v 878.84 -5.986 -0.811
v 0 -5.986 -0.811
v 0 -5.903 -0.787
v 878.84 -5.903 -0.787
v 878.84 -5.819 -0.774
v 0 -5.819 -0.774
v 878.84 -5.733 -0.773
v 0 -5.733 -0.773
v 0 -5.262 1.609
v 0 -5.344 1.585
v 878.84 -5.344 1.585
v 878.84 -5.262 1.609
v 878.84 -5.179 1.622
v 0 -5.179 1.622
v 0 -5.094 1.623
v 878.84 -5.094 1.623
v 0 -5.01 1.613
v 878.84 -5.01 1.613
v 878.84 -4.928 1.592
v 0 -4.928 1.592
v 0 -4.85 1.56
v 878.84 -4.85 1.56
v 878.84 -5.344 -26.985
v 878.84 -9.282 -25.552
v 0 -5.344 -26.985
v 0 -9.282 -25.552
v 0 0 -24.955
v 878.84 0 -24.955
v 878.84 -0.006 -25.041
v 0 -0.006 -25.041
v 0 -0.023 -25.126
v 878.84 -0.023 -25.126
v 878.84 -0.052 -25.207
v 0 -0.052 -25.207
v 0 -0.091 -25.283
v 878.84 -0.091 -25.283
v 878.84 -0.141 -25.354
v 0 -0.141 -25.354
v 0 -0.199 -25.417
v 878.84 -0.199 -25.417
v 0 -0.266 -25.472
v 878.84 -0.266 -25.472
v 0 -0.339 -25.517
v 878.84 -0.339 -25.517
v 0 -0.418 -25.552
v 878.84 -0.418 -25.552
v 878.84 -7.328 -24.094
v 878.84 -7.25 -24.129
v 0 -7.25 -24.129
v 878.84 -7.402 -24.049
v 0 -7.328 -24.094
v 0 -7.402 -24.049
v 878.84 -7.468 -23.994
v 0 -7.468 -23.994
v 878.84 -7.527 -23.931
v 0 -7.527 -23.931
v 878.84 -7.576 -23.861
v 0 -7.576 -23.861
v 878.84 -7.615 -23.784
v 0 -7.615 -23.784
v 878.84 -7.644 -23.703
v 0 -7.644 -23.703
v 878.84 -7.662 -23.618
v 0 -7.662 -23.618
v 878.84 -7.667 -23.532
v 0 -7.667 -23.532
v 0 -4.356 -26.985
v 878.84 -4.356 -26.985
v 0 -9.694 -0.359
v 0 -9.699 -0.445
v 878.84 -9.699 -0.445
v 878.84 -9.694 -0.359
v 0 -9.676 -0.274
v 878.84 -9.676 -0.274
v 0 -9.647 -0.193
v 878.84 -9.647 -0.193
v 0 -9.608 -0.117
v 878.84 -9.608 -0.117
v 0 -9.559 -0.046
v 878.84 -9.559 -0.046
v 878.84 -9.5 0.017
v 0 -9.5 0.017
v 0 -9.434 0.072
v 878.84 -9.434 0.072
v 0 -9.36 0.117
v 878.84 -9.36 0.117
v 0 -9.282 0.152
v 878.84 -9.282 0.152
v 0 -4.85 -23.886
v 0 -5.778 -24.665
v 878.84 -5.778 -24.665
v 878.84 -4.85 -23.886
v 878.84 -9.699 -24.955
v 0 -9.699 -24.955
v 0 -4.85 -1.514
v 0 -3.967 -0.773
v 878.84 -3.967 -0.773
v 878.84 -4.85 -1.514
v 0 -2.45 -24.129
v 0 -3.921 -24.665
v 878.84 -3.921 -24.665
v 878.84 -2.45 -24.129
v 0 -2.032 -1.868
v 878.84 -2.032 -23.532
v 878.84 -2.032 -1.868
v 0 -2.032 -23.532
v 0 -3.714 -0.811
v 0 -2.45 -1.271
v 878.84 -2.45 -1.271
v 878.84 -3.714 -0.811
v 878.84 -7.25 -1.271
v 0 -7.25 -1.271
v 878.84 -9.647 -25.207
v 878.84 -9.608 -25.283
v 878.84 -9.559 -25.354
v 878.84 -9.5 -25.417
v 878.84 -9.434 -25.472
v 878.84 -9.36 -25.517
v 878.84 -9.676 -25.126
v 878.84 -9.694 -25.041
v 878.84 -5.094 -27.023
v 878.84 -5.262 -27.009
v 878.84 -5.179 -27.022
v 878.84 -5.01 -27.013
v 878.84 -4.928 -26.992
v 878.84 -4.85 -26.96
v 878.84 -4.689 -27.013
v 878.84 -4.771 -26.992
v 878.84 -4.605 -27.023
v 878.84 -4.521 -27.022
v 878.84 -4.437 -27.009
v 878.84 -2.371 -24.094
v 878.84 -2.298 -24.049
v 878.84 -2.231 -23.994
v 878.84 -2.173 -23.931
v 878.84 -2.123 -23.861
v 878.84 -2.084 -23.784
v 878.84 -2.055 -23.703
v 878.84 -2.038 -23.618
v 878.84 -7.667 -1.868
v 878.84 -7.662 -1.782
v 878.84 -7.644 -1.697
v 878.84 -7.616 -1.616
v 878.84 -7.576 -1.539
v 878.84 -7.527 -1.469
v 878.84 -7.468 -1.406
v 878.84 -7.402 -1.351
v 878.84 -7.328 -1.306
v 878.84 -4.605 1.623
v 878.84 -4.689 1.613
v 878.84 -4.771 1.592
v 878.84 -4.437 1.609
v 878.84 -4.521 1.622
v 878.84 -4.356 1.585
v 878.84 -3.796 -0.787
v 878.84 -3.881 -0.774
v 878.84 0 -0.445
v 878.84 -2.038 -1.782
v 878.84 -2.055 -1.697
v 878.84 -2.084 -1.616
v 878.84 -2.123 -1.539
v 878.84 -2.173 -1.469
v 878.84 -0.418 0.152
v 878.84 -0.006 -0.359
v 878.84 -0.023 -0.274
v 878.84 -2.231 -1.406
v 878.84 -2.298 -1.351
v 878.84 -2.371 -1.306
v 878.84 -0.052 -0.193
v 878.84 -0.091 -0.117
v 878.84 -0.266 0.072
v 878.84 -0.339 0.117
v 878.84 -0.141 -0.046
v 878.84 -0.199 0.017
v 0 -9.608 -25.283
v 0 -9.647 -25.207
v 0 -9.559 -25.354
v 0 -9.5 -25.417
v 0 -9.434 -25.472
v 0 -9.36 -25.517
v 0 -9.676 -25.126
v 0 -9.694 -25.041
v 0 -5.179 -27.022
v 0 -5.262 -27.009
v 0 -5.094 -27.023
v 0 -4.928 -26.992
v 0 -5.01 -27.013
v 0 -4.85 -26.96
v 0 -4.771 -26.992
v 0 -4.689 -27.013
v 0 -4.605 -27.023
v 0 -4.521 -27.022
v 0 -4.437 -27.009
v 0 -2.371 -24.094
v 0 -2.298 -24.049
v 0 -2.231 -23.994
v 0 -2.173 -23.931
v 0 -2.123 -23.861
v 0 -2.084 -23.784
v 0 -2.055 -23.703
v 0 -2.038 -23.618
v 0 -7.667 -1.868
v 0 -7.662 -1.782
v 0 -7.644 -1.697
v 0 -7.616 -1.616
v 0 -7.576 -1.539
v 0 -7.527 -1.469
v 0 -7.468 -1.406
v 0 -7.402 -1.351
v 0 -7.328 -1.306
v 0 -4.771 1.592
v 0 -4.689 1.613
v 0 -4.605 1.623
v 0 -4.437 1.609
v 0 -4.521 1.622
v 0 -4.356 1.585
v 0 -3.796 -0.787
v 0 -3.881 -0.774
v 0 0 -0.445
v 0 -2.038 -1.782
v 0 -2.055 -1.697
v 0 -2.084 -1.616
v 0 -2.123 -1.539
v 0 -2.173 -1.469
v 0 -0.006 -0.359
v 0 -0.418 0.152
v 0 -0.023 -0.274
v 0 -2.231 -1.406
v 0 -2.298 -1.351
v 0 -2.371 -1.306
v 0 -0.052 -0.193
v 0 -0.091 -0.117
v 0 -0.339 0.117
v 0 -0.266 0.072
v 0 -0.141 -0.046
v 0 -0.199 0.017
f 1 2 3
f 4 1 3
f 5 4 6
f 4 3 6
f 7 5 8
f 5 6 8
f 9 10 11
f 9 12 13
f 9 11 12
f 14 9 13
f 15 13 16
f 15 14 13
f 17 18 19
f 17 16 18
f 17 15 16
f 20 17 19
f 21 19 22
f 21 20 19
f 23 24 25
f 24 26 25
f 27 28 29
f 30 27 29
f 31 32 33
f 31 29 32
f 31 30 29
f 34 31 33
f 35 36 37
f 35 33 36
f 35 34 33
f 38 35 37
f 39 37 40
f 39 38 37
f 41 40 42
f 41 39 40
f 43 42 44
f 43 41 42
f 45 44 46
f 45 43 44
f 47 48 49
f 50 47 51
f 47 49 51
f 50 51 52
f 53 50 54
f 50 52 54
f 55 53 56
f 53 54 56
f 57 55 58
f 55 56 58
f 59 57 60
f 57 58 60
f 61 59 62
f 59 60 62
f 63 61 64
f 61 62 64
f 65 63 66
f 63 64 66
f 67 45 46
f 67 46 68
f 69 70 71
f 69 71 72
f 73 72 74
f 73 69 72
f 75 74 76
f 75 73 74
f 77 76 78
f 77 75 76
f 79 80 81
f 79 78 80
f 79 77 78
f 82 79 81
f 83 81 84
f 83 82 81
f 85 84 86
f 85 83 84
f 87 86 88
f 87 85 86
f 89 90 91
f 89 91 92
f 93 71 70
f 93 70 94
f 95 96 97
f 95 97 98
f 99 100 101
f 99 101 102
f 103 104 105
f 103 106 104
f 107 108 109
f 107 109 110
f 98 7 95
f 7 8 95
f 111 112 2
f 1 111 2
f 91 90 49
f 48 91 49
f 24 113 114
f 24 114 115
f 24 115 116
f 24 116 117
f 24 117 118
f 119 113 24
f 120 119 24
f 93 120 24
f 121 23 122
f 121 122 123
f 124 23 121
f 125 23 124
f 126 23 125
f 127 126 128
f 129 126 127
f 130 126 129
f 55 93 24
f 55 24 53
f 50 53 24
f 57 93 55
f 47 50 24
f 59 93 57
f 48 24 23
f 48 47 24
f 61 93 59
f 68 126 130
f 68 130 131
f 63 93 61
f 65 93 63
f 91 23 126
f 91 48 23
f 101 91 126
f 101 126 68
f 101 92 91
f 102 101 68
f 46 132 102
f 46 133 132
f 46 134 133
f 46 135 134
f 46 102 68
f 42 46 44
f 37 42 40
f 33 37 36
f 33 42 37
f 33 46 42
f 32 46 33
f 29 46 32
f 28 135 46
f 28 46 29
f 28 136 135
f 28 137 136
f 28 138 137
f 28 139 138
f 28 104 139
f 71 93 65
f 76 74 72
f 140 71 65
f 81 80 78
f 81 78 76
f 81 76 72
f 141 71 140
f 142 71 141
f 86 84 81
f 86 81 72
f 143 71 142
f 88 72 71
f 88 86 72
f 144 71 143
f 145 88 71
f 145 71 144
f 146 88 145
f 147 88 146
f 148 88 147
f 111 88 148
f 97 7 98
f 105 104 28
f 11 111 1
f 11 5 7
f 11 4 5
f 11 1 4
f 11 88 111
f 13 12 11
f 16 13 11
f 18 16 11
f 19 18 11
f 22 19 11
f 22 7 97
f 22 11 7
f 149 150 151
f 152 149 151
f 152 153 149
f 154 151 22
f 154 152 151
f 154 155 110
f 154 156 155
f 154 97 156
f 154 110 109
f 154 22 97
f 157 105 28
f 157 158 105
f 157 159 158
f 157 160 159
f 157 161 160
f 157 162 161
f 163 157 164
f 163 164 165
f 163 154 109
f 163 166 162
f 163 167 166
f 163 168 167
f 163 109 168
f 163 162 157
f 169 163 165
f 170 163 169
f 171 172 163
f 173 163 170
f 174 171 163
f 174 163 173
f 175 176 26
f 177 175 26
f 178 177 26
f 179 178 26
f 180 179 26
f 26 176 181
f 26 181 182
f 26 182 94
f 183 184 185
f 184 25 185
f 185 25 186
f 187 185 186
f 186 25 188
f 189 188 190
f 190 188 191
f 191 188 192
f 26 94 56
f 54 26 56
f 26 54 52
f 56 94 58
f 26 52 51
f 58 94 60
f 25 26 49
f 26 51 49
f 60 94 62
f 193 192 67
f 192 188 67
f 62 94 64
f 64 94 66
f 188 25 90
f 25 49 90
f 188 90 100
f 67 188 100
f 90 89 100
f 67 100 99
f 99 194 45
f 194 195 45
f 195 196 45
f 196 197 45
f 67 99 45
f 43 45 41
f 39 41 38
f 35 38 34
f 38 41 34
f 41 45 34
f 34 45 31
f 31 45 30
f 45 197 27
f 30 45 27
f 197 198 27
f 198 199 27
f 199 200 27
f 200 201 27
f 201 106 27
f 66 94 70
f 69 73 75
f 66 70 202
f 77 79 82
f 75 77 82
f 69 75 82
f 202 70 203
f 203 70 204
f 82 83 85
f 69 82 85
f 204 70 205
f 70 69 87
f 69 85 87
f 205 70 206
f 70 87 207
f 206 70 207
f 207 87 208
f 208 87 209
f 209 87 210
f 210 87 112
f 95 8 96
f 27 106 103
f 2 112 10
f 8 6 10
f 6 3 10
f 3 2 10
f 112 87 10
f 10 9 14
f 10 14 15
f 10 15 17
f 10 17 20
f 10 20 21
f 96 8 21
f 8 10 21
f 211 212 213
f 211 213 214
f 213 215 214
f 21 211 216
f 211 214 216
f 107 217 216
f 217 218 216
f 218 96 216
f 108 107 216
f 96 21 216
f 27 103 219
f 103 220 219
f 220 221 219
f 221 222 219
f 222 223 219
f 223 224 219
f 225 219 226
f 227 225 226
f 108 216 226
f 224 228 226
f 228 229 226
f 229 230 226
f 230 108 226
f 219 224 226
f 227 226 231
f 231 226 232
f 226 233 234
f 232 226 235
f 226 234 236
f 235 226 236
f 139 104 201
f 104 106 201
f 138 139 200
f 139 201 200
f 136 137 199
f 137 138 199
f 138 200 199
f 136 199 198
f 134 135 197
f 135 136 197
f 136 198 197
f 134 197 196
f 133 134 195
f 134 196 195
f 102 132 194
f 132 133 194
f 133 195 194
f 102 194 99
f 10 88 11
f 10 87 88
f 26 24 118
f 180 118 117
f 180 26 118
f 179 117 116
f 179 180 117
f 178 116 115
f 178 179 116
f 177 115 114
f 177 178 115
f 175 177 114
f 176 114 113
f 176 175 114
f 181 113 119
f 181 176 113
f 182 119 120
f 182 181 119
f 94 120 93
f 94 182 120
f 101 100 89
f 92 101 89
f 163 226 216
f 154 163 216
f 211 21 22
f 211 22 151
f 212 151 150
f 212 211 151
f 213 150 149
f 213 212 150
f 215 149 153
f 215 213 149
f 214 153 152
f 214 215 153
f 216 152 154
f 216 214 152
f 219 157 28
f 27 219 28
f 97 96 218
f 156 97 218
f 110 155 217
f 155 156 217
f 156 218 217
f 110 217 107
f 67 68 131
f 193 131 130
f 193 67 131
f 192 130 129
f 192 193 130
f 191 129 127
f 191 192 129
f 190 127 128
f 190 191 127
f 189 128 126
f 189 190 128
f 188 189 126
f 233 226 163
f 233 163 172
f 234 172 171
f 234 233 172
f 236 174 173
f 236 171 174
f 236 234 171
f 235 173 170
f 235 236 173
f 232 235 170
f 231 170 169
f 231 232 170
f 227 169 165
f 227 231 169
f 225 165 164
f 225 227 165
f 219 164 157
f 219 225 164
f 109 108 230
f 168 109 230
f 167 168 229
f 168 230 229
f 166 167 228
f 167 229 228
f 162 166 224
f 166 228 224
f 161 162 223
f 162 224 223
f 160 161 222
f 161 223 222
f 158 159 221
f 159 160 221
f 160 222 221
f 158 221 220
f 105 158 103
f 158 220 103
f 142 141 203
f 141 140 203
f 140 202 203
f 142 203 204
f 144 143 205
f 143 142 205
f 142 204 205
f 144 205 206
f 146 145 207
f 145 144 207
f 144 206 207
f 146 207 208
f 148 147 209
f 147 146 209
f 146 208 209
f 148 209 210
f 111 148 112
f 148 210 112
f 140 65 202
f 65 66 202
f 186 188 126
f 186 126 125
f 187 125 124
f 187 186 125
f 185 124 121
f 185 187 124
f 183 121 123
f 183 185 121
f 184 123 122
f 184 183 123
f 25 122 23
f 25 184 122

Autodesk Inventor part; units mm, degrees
ref_plane "YZ Plane" through (0, 0, 0) normal (1, 0, 0) x (0, 1, 0)
ref_plane "XZ Plane" through (0, 0, 0) normal (0, 1, 0) x (-1, 0, 0)
ref_plane "XY Plane" through (0, 0, 0) normal (0, 0, 1) x (1, 0, 0)
sketch "Sketch1" plane through (0, 0, 0) normal (1, 0, 0) x (0, 1, 0)
  line L0 (0, -0.4446) -> (0, -24.9554)
  line L1 (-0.4178, -25.5521) -> (-4.3558, -26.9854)
  line L2 (-0.4178, 0.1521) -> (-4.3558, 1.5854)
  line L3 (-5.0594, 1.3969) -> (-6.4063, -0.2083)
  line L4 (-4.8497, -23.8856) -> (-4.8389, -24.1212)
  line L5 (-3.9874, -24.6889) -> (-2.4498, -24.1293)
  line L6 (-2.032, -23.5325) -> (-2.032, -1.8675)
  line L7 (-2.4498, -1.2707) -> (-3.7138, -0.8107)
  line L8 (-4.4174, -0.9992) -> (-4.8497, -1.5144)
  line L9 (-6.4063, -0.2083) -> (-4.8497, -1.5144)
  arc A0 (0, -0.4446) -> (-0.4178, 0.1521) centre (-0.635, -0.4446) ccw
  arc A1 (-2.032, -1.8675) -> (-2.4498, -1.2707) centre (-2.667, -1.8675) ccw
  arc A2 (-4.3558, 1.5854) -> (-5.0594, 1.3969) centre (-4.573, 0.9887) ccw
  arc A3 (-3.7138, -0.8107) -> (-4.4174, -0.9992) centre (-3.931, -1.4074) ccw
  arc A4 (-2.4498, -24.1293) -> (-2.032, -23.5325) centre (-2.667, -23.5325) ccw
  arc A5 (-0.4178, -25.5521) -> (0, -24.9554) centre (-0.635, -24.9554) ccw
  arc A6 (-4.8389, -24.1212) -> (-3.9874, -24.6889) centre (-4.2046, -24.0922) ccw
  line L10 (-4.8497, -23.8856) -> (-4.8497, -1.5144)
  line L11 (-9.6994, -0.4446) -> (-9.6994, -24.9554)
  line L12 (-9.2816, -25.5521) -> (-5.3436, -26.9854)
  line L13 (-9.2816, 0.1521) -> (-5.3436, 1.5854)
  line L14 (-4.64, 1.3969) -> (-3.2931, -0.2083)
  line L15 (-5.712, -24.6889) -> (-7.2496, -24.1293)
  line L16 (-7.6674, -23.5325) -> (-7.6674, -1.8675)
  line L17 (-7.2496, -1.2707) -> (-5.9856, -0.8107)
  line L18 (-5.282, -0.9992) -> (-4.8497, -1.5144)
  line L19 (-3.2931, -0.2083) -> (-4.8497, -1.5144)
  arc A7 (-9.2816, 0.1521) -> (-9.6994, -0.4446) centre (-9.0644, -0.4446) ccw
  arc A8 (-7.2496, -1.2707) -> (-7.6674, -1.8675) centre (-7.0324, -1.8675) ccw
  arc A9 (-4.64, 1.3969) -> (-5.3436, 1.5854) centre (-5.1264, 0.9887) ccw
  arc A10 (-5.282, -0.9992) -> (-5.9856, -0.8107) centre (-5.7685, -1.4074) ccw
  arc A11 (-7.6674, -23.5325) -> (-7.2496, -24.1293) centre (-7.0324, -23.5325) ccw
  arc A12 (-9.6994, -24.9554) -> (-9.2816, -25.5521) centre (-9.0644, -24.9554) ccw
  arc A13 (-5.712, -24.6889) -> (-4.8605, -24.1212) centre (-5.4948, -24.0922) ccw
  line L20 (-5.3436, -26.9854) -> (-4.3558, -26.9854)
  line L21 (0, -12.7) -> (-9.6994, -12.7)
  line L22 (-5.0594, -26.7969) -> (-6.4063, -25.1917)
  line L23 (-4.8389, -24.1212) -> (-4.8497, -23.8856)
  line L24 (-6.4063, -25.1917) -> (-4.8497, -23.8856)
  arc A14 (-5.0594, -26.7969) -> (-4.3558, -26.9854) centre (-4.573, -26.3887) ccw
  arc A15 (-5.3436, -26.9854) -> (-4.64, -26.7969) centre (-5.1264, -26.3887) ccw
  line L25 (-4.64, -26.7969) -> (-3.2931, -25.1917)
  line L26 (-4.8605, -24.1212) -> (-4.8497, -23.8856)
  line L27 (-3.2931, -25.1917) -> (-4.8497, -23.8856)
  point P0 (0, 0)
  point P1 (0, -25.4)
  point P2 (-4.7736, -27.1375)
  point P3 (-4.7736, 1.7375)
  point P4 (-4.7995, -24.9845)
  point P5 (-2.032, -23.9772)
  point P6 (-2.032, -1.4228)
  point P7 (-4.1316, -0.6586)
  dimension "d0" = 25.4
  dimension "d4" = 5.08
  dimension "d5" = 110
  dimension "d8" = 5.08
  dimension "d10" = 110
  dimension "d11" = 2.54
  dimension "d12" = 110
  dimension "d13" = 2.032
  dimension "d16" = 0.635
  dimension "d18" = 2.032
extrude "Extrusion1" add sketch "Sketch1" along normal blind 878.84 contours L0 L21 L6 A1 L7 A3 L19 L14 A9 A2 L2 A0 | L0 A5 L1 L20 A14 A15 L25 L27 L5 A4 L6 L21 | A9 L14 L19 A3 L8 L18 A10 L9 L3 A2 | A2 L3 L9 A10 L17 A8 L16 L21 L11 A7 L13 A9 | A14 L20 | L27 L5 A6 L4 | L26 A13 L15 L24 | L4 A6 L5 L27 L25 A15 A14 L22 L24 L15 A13 L26 | L9 A10 L18 | L8 A3 L19 | L16 A11 L15 L24 L22 A14 A15 L20 L12 A12 L11 L21 | A15 L20
properties part number "the smaller outside slider part"
